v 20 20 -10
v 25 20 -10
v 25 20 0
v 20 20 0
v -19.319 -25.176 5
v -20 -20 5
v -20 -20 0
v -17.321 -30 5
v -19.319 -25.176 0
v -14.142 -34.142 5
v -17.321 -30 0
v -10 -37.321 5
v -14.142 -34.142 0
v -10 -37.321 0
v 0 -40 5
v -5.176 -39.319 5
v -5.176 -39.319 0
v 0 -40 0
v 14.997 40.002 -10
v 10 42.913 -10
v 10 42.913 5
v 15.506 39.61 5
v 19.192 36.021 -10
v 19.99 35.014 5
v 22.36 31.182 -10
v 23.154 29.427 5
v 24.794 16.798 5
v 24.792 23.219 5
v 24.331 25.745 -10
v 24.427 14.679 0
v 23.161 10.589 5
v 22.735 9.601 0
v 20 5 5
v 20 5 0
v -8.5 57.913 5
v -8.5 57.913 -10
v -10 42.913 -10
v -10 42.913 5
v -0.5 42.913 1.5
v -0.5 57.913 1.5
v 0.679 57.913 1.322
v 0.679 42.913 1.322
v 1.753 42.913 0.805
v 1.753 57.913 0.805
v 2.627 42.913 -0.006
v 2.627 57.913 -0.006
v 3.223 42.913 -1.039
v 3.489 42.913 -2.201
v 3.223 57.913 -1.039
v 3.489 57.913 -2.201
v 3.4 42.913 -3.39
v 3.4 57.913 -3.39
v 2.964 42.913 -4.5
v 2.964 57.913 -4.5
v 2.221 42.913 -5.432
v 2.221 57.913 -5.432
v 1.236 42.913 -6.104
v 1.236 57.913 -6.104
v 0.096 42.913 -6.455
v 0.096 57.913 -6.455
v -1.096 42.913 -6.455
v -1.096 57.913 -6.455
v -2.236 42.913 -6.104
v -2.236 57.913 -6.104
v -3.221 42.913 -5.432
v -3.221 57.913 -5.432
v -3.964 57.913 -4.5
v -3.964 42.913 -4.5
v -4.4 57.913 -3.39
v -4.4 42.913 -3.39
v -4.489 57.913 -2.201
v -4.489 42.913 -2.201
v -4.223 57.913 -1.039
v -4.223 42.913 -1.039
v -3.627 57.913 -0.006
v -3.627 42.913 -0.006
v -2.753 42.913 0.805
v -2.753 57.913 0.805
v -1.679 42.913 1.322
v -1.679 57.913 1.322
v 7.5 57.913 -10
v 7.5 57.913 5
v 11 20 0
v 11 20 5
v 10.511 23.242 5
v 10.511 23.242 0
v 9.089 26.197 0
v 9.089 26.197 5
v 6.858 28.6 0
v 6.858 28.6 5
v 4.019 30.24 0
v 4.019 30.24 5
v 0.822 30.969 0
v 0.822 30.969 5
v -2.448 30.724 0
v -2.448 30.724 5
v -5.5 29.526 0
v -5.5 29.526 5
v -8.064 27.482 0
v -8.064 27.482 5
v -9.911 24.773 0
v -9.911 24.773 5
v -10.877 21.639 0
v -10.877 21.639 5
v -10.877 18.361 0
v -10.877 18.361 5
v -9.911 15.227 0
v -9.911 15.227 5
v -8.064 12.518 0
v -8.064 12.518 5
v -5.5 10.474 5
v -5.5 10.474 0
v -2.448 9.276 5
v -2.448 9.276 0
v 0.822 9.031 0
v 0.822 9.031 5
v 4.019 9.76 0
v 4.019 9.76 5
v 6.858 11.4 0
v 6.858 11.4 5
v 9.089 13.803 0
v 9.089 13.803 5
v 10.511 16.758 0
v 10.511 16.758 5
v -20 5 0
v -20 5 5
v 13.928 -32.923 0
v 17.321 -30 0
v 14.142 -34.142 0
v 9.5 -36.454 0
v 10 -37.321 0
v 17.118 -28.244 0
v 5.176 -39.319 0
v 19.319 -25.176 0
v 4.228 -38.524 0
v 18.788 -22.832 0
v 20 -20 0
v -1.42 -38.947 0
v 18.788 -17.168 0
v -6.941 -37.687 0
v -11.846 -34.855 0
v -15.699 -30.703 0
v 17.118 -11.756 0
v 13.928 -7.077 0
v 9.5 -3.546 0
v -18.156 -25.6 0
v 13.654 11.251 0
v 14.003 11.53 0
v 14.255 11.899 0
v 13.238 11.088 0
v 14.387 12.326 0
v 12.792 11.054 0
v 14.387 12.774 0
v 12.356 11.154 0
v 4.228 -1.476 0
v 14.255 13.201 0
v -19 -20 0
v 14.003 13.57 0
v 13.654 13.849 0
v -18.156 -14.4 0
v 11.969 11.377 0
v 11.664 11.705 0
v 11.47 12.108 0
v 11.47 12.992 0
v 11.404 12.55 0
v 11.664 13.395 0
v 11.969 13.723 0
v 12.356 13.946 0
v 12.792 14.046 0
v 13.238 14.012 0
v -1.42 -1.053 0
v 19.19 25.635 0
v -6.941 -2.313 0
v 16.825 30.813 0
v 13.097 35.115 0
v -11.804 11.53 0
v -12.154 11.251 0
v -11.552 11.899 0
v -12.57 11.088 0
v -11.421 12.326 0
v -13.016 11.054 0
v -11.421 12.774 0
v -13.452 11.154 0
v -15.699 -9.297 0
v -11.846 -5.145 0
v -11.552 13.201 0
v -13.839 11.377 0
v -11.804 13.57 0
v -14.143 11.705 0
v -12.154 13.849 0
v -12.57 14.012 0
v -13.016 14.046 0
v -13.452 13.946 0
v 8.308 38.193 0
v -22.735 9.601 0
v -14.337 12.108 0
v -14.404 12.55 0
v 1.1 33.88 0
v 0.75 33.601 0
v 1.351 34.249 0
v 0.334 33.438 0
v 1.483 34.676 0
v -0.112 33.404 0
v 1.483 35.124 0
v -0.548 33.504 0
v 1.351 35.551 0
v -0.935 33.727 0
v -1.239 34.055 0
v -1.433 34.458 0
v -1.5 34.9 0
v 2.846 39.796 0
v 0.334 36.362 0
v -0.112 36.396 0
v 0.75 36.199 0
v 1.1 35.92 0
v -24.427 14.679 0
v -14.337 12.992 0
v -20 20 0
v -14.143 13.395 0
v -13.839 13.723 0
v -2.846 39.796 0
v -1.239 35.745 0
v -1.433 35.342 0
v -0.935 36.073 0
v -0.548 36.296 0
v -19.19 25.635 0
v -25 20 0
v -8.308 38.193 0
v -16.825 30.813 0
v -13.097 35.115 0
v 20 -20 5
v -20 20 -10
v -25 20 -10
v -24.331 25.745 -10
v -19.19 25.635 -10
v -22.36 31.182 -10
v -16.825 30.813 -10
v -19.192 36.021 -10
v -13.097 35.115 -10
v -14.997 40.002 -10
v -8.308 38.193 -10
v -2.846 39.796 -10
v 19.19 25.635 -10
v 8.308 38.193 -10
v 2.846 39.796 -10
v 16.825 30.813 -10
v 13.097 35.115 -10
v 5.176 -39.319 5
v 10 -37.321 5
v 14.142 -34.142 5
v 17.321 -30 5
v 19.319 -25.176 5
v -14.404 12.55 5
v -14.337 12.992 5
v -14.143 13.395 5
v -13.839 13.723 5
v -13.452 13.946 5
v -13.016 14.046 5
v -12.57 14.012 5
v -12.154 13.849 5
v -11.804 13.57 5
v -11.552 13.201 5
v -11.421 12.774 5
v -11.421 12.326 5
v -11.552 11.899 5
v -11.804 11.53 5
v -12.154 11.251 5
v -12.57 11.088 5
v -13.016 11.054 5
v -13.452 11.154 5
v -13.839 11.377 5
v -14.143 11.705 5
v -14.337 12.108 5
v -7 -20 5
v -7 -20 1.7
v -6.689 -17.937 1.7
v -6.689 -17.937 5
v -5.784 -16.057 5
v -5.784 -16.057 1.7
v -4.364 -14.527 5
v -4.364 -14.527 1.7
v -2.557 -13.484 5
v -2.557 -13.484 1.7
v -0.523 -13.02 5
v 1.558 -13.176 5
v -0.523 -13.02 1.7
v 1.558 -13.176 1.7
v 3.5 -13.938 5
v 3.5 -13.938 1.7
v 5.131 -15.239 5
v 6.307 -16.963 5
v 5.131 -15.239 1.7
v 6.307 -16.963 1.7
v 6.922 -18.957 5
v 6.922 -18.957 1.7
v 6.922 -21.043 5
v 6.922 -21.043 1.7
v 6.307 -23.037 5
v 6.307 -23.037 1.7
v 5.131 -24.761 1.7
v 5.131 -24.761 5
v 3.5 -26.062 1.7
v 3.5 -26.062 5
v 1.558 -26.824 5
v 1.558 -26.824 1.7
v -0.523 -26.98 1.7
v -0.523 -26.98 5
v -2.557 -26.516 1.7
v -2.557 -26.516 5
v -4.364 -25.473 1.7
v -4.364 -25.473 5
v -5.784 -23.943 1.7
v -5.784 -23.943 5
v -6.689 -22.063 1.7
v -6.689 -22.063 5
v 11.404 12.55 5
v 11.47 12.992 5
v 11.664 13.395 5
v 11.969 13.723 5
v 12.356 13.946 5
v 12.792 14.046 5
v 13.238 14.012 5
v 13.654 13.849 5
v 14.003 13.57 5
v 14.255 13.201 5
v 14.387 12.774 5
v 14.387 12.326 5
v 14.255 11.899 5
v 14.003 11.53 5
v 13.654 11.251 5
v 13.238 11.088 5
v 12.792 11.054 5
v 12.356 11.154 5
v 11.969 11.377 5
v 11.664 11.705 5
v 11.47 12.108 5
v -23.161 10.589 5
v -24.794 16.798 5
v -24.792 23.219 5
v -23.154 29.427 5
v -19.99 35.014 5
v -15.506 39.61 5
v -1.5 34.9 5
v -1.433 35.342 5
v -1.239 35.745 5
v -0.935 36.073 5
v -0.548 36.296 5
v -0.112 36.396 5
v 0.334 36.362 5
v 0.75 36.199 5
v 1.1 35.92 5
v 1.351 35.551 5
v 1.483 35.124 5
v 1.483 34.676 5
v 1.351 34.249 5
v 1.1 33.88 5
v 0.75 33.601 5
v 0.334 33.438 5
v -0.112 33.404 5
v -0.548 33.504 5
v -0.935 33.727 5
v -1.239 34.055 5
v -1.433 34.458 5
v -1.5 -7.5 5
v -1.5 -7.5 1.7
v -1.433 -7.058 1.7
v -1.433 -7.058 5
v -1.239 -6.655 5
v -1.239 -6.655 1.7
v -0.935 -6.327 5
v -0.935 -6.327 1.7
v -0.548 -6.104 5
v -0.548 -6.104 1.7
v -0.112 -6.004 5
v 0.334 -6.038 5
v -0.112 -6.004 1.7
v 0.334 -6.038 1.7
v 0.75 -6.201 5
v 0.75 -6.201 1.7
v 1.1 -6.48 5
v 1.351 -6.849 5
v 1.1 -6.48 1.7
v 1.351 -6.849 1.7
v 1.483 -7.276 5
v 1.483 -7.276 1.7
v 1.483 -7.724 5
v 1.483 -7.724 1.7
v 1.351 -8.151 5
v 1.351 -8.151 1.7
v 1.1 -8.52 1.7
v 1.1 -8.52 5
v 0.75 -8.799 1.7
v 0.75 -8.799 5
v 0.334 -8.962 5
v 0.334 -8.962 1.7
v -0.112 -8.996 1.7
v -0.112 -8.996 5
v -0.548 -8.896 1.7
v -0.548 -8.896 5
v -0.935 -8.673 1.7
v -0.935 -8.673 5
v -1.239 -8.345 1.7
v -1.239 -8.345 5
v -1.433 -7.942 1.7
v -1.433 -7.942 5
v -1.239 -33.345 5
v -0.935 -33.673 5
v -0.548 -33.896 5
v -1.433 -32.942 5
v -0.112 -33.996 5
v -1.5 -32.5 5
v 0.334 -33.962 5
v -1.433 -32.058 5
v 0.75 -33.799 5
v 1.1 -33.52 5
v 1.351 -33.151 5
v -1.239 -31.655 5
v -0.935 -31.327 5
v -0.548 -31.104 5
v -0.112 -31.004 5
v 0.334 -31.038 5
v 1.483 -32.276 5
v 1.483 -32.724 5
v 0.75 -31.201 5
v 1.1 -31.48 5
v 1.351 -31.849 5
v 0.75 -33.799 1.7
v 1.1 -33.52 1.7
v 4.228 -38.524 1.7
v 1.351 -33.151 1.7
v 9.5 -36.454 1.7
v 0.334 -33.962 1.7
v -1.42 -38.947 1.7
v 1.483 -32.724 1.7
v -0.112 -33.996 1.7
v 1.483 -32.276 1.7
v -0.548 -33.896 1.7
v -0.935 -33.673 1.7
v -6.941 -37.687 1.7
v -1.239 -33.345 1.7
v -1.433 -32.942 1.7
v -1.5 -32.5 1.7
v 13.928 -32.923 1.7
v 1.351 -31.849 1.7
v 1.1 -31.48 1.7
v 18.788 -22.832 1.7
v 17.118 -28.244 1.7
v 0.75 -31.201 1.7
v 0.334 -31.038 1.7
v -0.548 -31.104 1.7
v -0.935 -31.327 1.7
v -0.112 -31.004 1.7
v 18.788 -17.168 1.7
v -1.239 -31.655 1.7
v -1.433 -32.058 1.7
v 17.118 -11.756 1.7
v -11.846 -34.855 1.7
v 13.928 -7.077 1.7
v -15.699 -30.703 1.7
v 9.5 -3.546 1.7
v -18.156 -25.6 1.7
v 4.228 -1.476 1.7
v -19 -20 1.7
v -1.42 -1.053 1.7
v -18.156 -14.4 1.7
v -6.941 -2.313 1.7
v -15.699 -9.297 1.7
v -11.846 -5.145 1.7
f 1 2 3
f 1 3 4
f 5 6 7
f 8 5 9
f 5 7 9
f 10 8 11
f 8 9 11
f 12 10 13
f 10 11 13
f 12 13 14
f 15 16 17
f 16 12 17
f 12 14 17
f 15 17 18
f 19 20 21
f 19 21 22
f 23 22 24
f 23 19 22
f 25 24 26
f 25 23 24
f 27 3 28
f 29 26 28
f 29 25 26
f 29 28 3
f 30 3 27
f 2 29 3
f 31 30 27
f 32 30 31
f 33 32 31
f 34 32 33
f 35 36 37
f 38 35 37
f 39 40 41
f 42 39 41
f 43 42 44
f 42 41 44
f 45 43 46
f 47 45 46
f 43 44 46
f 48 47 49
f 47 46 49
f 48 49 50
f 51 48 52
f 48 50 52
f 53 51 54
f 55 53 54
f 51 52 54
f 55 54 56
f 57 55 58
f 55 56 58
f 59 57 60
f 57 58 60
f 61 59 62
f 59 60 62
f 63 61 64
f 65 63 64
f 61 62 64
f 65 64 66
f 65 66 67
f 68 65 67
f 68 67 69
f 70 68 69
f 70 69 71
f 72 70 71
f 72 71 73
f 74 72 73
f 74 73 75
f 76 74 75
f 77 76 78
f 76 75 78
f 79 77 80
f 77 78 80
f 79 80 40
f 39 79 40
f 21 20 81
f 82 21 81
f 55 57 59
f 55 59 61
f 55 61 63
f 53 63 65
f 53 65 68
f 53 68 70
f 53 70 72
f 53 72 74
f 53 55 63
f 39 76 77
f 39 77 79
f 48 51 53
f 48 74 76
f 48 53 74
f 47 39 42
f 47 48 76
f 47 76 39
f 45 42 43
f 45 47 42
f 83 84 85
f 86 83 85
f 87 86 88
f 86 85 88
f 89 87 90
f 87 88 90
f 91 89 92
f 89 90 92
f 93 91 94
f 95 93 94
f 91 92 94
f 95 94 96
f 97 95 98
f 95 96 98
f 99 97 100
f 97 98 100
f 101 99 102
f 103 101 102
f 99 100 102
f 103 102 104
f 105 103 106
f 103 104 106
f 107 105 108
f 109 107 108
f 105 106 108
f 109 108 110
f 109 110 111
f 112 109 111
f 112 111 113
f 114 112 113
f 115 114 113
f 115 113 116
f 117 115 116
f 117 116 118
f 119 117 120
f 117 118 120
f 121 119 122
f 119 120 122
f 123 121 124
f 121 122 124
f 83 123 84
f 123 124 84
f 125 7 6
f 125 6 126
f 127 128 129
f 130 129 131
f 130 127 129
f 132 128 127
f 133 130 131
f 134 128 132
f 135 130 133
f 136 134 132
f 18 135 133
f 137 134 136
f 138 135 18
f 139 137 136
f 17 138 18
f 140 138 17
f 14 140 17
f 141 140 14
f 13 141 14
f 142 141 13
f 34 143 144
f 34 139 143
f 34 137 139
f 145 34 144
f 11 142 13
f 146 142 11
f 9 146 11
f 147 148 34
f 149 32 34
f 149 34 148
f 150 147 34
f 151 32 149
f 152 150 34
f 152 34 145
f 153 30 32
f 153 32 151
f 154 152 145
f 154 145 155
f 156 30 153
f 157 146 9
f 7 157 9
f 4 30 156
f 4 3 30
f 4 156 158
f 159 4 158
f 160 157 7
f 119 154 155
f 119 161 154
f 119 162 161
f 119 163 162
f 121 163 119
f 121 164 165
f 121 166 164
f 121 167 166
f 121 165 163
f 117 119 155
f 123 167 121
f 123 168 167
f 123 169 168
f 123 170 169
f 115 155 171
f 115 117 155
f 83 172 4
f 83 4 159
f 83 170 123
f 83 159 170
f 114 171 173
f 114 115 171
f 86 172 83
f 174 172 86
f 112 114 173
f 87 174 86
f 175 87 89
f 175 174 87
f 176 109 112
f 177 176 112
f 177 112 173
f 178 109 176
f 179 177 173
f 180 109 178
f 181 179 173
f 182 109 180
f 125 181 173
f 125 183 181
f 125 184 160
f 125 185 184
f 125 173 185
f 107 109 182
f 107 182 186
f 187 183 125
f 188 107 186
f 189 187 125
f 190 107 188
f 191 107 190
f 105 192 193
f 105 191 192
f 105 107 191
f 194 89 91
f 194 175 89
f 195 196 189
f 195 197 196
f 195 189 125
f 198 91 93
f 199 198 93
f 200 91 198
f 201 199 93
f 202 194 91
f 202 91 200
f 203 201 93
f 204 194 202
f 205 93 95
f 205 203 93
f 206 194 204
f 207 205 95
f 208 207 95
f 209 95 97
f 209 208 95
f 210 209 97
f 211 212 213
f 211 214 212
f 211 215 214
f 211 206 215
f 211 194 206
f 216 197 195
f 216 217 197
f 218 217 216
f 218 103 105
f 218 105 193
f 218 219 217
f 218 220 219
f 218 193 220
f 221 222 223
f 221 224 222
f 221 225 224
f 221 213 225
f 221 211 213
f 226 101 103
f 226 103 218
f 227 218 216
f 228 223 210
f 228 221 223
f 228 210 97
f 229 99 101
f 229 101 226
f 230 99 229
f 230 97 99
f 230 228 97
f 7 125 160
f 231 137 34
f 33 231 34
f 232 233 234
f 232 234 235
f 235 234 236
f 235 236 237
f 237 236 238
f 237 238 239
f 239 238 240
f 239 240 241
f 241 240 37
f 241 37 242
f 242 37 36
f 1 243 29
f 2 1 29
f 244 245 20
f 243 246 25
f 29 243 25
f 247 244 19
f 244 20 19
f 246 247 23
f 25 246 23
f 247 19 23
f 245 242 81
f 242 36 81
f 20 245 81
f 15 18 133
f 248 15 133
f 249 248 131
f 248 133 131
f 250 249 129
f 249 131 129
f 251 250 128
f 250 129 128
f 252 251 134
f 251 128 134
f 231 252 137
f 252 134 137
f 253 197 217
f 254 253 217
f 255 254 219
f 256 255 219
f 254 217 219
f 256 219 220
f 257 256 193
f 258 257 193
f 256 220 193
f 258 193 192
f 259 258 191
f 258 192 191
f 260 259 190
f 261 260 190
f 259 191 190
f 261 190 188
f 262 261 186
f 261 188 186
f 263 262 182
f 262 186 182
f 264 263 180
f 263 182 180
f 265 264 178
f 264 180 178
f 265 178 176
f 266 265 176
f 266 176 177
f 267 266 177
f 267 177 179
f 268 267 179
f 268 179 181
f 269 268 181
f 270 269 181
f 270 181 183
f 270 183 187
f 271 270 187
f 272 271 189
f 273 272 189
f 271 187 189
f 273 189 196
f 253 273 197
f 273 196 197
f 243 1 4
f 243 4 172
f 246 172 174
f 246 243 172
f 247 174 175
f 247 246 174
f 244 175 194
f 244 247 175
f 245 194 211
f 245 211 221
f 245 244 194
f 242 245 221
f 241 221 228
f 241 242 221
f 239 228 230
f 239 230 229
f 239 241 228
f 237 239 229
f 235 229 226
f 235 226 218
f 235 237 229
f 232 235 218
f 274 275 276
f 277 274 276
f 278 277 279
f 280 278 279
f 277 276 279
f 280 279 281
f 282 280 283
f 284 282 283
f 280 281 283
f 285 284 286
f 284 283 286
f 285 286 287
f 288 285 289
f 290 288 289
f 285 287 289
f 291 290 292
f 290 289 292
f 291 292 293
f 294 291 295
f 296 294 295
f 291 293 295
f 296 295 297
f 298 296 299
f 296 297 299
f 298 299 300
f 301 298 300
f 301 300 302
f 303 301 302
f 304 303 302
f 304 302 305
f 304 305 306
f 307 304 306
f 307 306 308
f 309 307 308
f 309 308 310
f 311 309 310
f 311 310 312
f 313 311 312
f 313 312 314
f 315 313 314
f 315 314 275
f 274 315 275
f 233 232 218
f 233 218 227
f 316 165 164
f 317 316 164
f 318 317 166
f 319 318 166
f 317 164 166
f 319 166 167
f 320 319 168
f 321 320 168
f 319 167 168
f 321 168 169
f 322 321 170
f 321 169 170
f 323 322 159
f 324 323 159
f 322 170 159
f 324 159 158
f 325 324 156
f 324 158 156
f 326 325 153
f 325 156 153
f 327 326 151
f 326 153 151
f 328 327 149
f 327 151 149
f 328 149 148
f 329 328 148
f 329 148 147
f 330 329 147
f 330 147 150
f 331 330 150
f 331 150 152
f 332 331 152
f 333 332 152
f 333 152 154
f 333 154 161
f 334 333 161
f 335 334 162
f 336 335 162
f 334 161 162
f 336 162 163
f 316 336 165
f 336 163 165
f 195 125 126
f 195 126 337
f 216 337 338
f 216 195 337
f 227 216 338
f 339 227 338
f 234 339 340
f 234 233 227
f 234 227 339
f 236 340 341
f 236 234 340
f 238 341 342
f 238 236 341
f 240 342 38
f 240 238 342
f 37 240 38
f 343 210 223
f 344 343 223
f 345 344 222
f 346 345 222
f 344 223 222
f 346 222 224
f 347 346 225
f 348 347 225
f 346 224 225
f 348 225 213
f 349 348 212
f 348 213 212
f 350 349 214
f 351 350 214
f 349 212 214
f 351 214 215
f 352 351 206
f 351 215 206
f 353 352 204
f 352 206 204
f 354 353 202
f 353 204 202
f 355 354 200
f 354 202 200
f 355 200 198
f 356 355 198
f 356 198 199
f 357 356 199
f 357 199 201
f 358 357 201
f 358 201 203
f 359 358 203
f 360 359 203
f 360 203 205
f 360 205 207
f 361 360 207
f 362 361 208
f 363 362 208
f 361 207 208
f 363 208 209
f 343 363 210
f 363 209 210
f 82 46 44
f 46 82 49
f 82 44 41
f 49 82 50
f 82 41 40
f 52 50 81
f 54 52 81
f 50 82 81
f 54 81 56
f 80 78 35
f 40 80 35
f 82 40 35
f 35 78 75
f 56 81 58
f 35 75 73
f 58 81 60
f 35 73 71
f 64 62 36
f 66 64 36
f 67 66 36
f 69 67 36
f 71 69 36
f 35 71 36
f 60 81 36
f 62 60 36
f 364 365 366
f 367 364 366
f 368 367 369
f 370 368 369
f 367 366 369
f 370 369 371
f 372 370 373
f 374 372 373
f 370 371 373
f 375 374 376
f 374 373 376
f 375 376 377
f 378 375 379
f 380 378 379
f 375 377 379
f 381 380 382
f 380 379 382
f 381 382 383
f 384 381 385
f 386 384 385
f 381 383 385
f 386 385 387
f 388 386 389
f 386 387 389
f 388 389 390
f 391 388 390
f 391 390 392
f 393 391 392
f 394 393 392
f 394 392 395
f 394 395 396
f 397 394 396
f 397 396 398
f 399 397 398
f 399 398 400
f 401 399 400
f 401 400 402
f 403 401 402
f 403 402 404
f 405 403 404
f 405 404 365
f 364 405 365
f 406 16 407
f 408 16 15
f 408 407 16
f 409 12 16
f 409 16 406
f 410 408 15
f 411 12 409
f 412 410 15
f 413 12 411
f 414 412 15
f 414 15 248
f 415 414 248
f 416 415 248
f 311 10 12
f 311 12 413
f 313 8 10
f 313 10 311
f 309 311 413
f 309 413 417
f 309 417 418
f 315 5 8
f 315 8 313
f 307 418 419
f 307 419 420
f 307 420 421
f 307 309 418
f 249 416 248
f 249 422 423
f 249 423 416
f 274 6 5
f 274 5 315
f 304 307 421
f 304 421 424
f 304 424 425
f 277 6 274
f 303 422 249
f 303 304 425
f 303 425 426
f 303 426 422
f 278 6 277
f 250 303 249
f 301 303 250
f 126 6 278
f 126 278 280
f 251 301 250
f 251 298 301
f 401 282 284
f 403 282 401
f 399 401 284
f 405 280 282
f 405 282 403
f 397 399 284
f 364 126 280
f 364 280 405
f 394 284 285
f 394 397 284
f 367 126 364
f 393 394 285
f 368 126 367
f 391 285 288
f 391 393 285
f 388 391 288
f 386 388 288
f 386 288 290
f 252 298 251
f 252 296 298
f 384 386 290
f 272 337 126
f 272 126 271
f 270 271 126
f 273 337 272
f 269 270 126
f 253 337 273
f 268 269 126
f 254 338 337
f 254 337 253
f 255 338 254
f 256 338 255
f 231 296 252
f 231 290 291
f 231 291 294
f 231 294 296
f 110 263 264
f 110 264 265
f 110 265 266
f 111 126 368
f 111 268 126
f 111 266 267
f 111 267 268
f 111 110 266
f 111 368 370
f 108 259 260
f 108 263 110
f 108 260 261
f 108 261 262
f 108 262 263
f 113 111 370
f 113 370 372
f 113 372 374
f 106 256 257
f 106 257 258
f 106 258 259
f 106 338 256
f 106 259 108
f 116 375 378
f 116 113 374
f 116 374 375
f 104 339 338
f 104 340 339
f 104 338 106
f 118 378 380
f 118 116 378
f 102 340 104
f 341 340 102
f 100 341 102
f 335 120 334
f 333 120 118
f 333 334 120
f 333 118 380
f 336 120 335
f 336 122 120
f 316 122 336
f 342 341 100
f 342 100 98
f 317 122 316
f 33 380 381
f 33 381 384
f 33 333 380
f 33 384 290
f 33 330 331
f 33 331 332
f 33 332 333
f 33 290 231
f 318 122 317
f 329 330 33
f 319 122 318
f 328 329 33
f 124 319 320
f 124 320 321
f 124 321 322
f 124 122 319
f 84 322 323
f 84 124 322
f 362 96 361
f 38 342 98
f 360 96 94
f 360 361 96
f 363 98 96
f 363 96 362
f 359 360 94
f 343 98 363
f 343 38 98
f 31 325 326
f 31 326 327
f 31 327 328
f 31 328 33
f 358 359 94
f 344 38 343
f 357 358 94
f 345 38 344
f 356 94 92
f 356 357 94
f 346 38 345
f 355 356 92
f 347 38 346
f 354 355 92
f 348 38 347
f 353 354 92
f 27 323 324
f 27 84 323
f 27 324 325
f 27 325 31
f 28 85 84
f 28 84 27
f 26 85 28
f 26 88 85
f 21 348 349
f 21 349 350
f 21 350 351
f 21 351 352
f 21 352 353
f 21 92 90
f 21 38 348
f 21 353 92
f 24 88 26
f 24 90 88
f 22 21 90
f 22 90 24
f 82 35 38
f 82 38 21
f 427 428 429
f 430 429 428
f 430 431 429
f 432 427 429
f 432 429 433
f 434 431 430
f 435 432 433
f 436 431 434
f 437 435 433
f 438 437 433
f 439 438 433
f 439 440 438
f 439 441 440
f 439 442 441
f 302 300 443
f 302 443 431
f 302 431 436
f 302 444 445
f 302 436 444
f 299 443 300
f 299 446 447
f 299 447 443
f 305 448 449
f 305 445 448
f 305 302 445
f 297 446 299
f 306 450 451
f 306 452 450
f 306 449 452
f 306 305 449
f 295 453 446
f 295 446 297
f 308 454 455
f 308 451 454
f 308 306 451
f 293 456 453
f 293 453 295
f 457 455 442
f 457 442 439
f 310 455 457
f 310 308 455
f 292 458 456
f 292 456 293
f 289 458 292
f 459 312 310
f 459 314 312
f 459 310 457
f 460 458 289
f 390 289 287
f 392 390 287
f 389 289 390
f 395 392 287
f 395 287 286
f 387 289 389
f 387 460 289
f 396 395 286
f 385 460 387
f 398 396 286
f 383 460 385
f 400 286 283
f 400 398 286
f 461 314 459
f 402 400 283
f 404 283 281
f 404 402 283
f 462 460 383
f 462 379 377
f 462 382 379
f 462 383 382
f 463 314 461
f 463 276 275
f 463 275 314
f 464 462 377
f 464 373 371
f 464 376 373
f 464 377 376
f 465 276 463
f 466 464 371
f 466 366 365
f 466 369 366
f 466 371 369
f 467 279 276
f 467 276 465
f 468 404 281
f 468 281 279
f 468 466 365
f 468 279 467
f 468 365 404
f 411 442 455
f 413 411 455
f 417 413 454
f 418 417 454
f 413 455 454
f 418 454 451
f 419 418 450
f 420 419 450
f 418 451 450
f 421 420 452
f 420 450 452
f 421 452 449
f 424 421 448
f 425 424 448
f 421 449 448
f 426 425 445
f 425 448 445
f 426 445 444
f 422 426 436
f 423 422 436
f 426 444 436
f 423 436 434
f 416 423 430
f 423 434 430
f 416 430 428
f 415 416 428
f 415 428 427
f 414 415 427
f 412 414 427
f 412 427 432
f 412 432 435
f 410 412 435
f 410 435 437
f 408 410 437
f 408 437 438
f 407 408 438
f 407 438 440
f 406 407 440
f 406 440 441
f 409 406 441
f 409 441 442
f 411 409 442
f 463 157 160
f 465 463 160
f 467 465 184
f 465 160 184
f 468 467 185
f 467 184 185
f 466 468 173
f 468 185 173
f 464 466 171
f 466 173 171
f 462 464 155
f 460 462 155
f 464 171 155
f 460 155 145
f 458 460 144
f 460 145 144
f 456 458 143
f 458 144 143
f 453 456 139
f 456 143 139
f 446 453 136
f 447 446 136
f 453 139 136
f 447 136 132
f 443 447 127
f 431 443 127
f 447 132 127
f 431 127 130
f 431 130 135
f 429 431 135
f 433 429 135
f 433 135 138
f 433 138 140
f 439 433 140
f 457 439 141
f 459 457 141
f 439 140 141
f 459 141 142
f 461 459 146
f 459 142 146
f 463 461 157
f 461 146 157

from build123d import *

# Parameters (mm, degrees)
SKETCH1_W           = 40
SKETCH1_H           = 80
BOSS_EXTRUDE1_DEPTH = 5
SKETCH2_R           = 11
CUT_EXTRUDE1_DEPTH  = 5
SKETCH3_R           = 1.5
CUT_EXTRUDE2_DEPTH  = 5
SKETCH4_R           = 1.5
CUT_EXTRUDE3_DEPTH  = 5
SKETCH6_R           = 19
CUT_EXTRUDE4_DEPTH  = 1.7
SKETCH7_R           = 7
CUT_EXTRUDE5_DEPTH  = 45.842948164
CUT_EXTRUDE6_DEPTH  = 46
BOSS_EXTRUDE2_DEPTH = 5
BOSS_EXTRUDE3_START = 10
BOSS_EXTRUDE3_DEPTH = 10
BOSS_EXTRUDE4_DEPTH = 15
SKETCH12_R          = 3
CUT_EXTRUDE7_DEPTH  = 15
SKETCH13_R          = 4
CUT_EXTRUDE8_DEPTH  = 15


with BuildPart() as part:
    # Sketch1 → Boss-Extrude1 (new body)
    with BuildSketch(Plane.XY):
        Rectangle(SKETCH1_W, SKETCH1_H)
    extrude(amount=BOSS_EXTRUDE1_DEPTH)

    # Sketch2 → Cut-Extrude1 (cut)
    with BuildSketch(Plane.XY.offset(5)):
        with Locations((0, 20)):
            Circle(SKETCH2_R)
    extrude(amount=-CUT_EXTRUDE1_DEPTH, mode=Mode.SUBTRACT)

    # Sketch3 → Cut-Extrude2 (cut)
    with BuildSketch(Plane(origin=(0, 0, 0), x_dir=(-1, 0, 0), z_dir=(0, 0, -1))):
        with Locations((0, 34.9)):
            Circle(SKETCH3_R)
        with Locations((12.903778516, 12.55)):
            Circle(SKETCH3_R)
        with Locations((-12.903778516, 12.55)):
            Circle(SKETCH3_R)
    extrude(amount=-CUT_EXTRUDE2_DEPTH, mode=Mode.SUBTRACT)

    # Sketch4 → Cut-Extrude3 (cut)
    with BuildSketch(Plane(origin=(0, 0, 0), x_dir=(-1, 0, 0), z_dir=(0, 0, -1))):
        with Locations((0, -7.5)):
            Circle(SKETCH4_R)
        with Locations((0, -32.5)):
            Circle(SKETCH4_R)
    extrude(amount=-CUT_EXTRUDE3_DEPTH, mode=Mode.SUBTRACT)

    # Sketch6 → Cut-Extrude4 (cut)
    with BuildSketch(Plane(origin=(0, 0, 0), x_dir=(-1, 0, 0), z_dir=(0, 0, -1))):
        with Locations((0, -20)):
            Circle(SKETCH6_R)
    extrude(amount=-CUT_EXTRUDE4_DEPTH, mode=Mode.SUBTRACT)

    # Sketch7 → Cut-Extrude5 (cut, through all)
    with BuildSketch(Plane(origin=(0, 0, 1.7), x_dir=(-1, 0, 0), z_dir=(0, 0, -1))):
        with Locations((0, -20)):
            Circle(SKETCH7_R)
    extrude(amount=-CUT_EXTRUDE5_DEPTH, mode=Mode.SUBTRACT)

    # Sketch8 → Cut-Extrude6 (cut, through all)
    with BuildSketch(Plane(origin=(0, 0, 0), x_dir=(-1, 0, 0), z_dir=(0, 0, -1))):
        with BuildLine():
            Line((-20, 40), (-20, 20))
            ThreePointArc((-20, 20), (-14.142135605, 34.142135642), (5.2e-08, 40))
            Line((5.2e-08, 40), (-20, 40))
        make_face()
        with BuildLine():
            Line((20, 40), (5.2e-08, 40))
            ThreePointArc((5.2e-08, 40), (14.142135642, 34.142135605), (20, 20))
            Line((20, 20), (20, 40))
        make_face()
        with BuildLine():
            ThreePointArc((-6e-09, -40), (-14.142135626, -34.142135622), (-20, -20))
            Line((-20, -20), (-20, -40))
            Line((-20, -40), (-6e-09, -40))
        make_face()
        with BuildLine():
            ThreePointArc((20, -20), (14.142135622, -34.142135626), (-6e-09, -40))
            Line((-6e-09, -40), (20, -40))
            Line((20, -40), (20, -20))
        make_face()
    extrude(amount=-CUT_EXTRUDE6_DEPTH, mode=Mode.SUBTRACT)

    # Sketch9 → Boss-Extrude2 (add)
    with BuildSketch(Plane(origin=(0, 0, 0), x_dir=(-1, 0, 0), z_dir=(0, 0, -1))):
        with BuildLine():
            Line((20, 20), (20, 5))
            ThreePointArc((20, 5), (0, 45), (-20, 5))
            Line((-20, 5), (-20, 20))
            ThreePointArc((-20, 20), (0, 40), (20, 20))
        make_face()
    extrude(amount=-BOSS_EXTRUDE2_DEPTH)

    # Sketch10 → Boss-Extrude3 (add)
    with BuildSketch(Plane(origin=(0, 0, 0), x_dir=(-1, 0, 0), z_dir=(0, 0, -1)).offset(BOSS_EXTRUDE3_START)):
        with BuildLine():
            Line((20, 20), (25, 20))
            ThreePointArc((25, 20), (0, 45), (-25, 20))
            Line((-25, 20), (-20, 20))
            ThreePointArc((-20, 20), (0, 40), (20, 20))
        make_face()
    extrude(amount=-BOSS_EXTRUDE3_DEPTH)

    # Sketch11 → Boss-Extrude4 (add)
    with BuildSketch(Plane(origin=(0, 0, -10), x_dir=(-1, 0, 0), z_dir=(0, 0, -1))):
        Polygon((-10, 42.912878475), (-7.5, 57.912878475), (8.5, 57.912878475), (10, 42.912878475), align=None)
    extrude(amount=-BOSS_EXTRUDE4_DEPTH)

    # Sketch12 → Cut-Extrude7 (cut)
    with BuildSketch(Plane(origin=(0, 57.912878475, 0), x_dir=(1, 0, 0), z_dir=(0, 1, 0))):
        with Locations(Location((-0.5, 2.5, 0), (0, 0, 270))):
            Circle(SKETCH12_R)
    extrude(amount=-CUT_EXTRUDE7_DEPTH, mode=Mode.SUBTRACT)

    # Sketch13 → Cut-Extrude8 (cut)
    with BuildSketch(Plane(origin=(0, 57.912878475, 0), x_dir=(1, 0, 0), z_dir=(0, 1, 0))):
        with Locations(Location((-0.5, 2.5, 0), (0, 0, 270))):
            Circle(SKETCH13_R)
    extrude(amount=-CUT_EXTRUDE8_DEPTH, mode=Mode.SUBTRACT)


solid = part.part
